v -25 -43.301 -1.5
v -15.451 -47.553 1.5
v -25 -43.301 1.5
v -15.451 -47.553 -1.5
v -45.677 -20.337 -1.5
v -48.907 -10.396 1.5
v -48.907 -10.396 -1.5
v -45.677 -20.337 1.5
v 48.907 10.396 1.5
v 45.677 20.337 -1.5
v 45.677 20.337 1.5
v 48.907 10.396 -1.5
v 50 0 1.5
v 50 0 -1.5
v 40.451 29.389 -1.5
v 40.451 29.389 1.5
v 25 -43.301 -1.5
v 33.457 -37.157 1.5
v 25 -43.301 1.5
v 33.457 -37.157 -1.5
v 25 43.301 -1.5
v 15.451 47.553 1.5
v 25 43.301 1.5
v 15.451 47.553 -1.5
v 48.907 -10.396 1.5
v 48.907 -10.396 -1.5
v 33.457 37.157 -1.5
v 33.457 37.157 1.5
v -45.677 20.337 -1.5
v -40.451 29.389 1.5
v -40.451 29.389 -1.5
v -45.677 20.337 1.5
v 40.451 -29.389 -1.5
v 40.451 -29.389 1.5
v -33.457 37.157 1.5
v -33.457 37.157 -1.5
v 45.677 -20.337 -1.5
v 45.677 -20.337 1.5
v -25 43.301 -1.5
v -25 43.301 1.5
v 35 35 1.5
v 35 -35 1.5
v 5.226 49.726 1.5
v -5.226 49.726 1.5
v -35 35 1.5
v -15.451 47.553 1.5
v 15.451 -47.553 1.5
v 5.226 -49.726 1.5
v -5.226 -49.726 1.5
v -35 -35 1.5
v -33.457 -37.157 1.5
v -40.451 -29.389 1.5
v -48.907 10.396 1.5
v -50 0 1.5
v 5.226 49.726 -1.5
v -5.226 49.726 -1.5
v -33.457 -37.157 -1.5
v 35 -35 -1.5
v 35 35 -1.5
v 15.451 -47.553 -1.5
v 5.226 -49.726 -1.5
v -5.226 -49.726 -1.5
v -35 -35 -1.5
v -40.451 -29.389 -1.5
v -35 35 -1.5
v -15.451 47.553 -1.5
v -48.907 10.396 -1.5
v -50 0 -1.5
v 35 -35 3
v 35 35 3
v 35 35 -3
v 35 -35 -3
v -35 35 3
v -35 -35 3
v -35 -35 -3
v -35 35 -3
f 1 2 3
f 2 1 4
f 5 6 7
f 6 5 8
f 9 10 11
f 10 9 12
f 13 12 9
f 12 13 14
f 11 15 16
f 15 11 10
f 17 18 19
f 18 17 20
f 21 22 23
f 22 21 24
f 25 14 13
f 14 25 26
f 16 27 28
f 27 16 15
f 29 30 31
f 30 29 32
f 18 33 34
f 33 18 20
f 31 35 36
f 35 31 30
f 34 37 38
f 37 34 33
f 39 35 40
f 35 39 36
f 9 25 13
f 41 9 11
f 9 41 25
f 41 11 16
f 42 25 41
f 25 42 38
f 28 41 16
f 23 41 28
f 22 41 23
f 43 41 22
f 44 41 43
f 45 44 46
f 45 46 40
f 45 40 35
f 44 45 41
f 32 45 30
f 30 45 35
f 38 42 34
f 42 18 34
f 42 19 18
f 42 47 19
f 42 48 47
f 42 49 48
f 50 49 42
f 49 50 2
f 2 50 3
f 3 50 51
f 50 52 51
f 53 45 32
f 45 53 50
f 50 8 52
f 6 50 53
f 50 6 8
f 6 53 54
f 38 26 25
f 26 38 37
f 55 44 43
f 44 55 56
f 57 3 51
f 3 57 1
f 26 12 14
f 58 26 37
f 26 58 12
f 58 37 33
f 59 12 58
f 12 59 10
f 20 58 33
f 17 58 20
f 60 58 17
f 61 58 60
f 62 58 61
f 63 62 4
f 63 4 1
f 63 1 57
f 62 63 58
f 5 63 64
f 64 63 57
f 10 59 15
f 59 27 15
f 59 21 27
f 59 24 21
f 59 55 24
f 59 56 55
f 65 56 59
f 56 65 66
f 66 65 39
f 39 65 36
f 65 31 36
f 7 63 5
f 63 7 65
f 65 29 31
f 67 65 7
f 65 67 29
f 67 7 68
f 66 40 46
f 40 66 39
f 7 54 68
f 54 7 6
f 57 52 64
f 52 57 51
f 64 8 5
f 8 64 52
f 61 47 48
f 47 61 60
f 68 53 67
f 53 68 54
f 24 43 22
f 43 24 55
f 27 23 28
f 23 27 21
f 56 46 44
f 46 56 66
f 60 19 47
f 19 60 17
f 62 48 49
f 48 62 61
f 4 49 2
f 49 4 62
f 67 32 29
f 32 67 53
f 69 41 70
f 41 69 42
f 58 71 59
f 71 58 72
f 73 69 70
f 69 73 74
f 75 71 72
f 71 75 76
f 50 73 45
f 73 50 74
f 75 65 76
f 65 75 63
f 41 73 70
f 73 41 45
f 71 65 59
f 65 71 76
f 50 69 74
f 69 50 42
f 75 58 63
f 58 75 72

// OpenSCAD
radius = 50;
size = 2 * radius * cos(45);
thickness = 3;

WhatsItCentered();

module WhatsIt() {
	cylinder(r = 50, h = 3);
	cube([70, 70, 3]);
}

module WhatsItCentered() {
	cylinder(r = 50, h = 3, center = true);
	cube([70, 70, 3 * 2], center = true);
}
